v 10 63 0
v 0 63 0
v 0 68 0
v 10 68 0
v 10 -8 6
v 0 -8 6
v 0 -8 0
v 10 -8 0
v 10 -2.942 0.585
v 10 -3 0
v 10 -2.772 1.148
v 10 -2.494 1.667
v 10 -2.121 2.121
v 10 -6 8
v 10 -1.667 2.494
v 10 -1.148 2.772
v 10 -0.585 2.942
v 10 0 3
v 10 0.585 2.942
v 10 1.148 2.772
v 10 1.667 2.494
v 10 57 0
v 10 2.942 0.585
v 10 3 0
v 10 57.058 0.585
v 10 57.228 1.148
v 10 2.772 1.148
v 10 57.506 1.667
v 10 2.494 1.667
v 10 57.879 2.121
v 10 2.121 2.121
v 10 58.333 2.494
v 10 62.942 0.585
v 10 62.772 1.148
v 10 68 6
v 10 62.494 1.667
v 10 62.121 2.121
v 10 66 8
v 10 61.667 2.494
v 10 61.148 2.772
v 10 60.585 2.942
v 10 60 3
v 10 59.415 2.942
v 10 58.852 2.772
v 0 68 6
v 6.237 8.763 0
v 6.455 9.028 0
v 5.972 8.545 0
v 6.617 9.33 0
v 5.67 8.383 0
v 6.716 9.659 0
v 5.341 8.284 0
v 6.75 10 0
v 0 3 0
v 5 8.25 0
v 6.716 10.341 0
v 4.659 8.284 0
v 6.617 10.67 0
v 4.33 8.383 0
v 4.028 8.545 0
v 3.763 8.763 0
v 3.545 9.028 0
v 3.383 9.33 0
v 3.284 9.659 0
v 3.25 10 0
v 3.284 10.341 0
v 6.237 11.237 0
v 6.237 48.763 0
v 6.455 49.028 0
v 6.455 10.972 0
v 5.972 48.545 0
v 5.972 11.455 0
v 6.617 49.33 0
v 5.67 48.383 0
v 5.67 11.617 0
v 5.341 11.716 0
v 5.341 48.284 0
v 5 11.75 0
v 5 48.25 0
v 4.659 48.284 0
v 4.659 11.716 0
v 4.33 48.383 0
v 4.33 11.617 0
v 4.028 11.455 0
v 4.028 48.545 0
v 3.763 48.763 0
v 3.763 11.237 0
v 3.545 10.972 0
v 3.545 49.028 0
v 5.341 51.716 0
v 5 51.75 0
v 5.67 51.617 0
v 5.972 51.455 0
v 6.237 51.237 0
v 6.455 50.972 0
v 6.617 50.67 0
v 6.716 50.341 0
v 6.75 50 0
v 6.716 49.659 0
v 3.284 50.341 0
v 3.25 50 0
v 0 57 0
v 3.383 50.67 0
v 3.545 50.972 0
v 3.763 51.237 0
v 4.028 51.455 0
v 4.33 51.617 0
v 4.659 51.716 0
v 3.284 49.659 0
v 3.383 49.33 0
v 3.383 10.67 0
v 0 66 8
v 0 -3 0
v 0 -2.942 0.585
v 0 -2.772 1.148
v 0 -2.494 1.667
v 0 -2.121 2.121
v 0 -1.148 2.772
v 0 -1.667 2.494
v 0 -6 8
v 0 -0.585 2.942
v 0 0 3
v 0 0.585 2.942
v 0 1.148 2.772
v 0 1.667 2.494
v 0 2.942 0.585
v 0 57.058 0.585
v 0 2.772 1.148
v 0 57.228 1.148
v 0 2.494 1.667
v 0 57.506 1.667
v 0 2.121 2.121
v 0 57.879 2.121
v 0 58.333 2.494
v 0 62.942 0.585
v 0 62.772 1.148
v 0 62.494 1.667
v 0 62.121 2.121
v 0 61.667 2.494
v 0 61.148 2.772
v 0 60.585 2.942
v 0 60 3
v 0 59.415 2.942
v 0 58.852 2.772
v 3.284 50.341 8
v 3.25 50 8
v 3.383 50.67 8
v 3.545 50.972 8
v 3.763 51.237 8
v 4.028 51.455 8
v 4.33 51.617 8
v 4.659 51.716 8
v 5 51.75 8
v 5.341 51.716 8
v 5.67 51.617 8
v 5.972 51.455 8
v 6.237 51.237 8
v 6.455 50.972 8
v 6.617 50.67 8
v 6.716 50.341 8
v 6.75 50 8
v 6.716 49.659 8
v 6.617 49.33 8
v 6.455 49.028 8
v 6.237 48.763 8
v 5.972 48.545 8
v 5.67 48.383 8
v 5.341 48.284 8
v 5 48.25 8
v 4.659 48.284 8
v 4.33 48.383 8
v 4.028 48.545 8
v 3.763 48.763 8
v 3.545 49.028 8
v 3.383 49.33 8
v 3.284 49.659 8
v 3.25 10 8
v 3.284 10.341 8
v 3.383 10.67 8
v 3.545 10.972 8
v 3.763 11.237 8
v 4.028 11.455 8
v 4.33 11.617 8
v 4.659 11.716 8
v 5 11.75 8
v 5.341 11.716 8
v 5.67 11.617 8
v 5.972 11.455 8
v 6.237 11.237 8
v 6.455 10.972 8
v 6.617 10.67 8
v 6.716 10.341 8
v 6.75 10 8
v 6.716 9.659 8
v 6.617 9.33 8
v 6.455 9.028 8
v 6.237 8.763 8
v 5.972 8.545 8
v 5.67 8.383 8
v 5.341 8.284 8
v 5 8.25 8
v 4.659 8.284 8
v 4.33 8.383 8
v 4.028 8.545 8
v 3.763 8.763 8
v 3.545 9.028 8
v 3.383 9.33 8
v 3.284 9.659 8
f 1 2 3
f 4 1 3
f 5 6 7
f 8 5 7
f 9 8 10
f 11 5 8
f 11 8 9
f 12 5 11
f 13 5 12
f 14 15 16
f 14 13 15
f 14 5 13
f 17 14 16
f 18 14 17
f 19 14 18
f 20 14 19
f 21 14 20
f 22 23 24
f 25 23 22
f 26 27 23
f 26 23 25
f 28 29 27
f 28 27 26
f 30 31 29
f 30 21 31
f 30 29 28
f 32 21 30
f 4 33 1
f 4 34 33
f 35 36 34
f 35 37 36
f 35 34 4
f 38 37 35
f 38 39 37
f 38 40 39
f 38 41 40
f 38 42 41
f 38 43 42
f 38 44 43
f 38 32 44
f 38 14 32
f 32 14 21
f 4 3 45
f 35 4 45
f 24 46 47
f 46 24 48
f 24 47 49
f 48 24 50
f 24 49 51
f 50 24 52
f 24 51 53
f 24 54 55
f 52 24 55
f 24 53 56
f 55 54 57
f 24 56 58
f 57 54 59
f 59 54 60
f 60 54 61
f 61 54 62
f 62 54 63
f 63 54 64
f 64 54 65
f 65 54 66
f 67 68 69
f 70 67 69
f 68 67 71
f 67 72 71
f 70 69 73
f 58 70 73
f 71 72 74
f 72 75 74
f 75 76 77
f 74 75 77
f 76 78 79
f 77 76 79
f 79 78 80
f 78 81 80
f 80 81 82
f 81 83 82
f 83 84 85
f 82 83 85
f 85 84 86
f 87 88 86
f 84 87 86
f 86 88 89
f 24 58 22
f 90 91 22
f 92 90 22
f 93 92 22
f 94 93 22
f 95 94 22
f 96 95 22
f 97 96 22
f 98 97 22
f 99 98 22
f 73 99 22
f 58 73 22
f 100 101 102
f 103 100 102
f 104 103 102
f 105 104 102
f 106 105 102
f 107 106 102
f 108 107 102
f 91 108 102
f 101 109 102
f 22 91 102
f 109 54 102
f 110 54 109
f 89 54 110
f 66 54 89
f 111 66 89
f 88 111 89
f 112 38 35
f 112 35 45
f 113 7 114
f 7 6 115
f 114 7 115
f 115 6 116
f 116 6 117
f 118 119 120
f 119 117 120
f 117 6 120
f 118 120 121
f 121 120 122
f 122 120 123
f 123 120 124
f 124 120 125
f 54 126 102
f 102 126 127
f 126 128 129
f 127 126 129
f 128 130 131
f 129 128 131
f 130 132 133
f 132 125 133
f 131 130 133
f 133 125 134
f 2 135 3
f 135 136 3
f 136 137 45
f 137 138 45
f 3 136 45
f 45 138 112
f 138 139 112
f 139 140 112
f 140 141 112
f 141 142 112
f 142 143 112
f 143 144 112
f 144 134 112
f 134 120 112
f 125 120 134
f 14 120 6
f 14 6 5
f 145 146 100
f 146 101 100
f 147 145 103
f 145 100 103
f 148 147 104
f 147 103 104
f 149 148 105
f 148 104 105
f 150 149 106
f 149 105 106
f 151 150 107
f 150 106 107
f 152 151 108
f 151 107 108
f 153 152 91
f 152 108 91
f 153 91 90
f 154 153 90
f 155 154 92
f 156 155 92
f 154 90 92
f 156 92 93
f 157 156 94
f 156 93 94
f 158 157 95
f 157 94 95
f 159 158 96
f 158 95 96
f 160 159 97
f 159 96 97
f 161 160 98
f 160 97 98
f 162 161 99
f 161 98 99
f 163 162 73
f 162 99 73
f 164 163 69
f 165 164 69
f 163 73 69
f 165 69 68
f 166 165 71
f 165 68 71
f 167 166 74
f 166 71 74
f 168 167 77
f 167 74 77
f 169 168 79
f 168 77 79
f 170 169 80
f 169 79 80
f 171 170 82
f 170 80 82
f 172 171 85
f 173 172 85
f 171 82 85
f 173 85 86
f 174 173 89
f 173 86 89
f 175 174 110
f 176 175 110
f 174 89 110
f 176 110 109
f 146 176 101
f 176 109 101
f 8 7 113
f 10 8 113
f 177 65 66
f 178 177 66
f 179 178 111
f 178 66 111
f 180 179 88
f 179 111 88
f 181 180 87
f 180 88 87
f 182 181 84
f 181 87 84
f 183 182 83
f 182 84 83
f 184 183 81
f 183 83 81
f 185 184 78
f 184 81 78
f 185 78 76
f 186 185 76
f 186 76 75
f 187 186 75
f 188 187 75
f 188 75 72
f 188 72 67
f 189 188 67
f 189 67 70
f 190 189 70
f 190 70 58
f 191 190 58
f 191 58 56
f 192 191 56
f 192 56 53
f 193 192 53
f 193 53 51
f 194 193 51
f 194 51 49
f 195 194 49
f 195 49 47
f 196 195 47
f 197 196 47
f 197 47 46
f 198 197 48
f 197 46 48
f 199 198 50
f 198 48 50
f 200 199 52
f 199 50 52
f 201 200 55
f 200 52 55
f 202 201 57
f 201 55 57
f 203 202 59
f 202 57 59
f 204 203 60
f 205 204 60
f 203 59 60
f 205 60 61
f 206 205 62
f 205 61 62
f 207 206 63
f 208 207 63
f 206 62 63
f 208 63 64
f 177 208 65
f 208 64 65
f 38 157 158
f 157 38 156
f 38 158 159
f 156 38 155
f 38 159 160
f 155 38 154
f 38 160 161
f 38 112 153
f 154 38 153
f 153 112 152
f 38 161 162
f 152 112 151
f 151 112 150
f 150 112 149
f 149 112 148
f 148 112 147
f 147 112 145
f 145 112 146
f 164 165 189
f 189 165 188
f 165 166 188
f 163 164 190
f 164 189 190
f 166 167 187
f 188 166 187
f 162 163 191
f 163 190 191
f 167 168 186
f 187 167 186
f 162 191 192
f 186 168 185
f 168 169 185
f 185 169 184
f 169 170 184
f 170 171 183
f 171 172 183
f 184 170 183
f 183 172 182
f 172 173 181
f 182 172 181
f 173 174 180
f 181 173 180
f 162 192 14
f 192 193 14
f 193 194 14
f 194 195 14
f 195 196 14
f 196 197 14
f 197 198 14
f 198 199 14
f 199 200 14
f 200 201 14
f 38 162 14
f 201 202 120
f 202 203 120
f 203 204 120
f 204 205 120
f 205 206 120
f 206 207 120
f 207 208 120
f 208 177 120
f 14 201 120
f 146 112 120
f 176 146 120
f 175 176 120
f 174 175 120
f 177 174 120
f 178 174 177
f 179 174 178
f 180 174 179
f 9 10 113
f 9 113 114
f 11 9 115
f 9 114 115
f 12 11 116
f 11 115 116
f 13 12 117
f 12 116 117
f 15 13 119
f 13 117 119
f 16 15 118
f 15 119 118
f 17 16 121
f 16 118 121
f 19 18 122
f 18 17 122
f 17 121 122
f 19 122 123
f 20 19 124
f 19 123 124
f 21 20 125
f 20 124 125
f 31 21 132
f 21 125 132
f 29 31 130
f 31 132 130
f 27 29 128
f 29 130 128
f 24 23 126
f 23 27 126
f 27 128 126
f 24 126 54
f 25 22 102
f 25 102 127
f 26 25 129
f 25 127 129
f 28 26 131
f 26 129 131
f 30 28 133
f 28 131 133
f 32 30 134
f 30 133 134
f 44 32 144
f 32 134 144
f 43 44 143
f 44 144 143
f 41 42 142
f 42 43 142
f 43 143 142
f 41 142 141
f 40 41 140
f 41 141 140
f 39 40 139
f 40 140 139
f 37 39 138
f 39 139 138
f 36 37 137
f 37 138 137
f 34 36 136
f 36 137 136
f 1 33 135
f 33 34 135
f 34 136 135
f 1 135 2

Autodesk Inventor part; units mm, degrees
ref_plane "YZ Plane" through (0, 0, 0) normal (1, 0, 0) x (0, 1, 0)
ref_plane "XZ Plane" through (0, 0, 0) normal (0, 1, 0) x (-1, 0, 0)
ref_plane "XY Plane" through (0, 0, 0) normal (0, 0, 1) x (1, 0, 0)
sketch "Szkic1" plane through (0, 0, 0) normal (1, 0, 0) x (0, 1, 0)
  circle A0 centre (0, 0) radius 3 construction
  circle A1 centre (60, 0) radius 3 construction
  arc A2 (63, 0) -> (57, 0) centre (60, 0) ccw
  arc A3 (3, 0) -> (-3, 0) centre (0, 0) ccw
  line L0 (68, 0) -> (68, 8)
  line L1 (68, 8) -> (-8, 8)
  line L2 (-8, 8) -> (-8, 0)
  line L3 (63, 0) -> (68, 0)
  line L4 (-8, 0) -> (-3, 0)
  line L5 (3, 0) -> (57, 0)
  point P0 (-5.5, 0)
  dimension "d0" = 6
  dimension "d1" = 6
  dimension "d2" = 60
  dimension "d3" = 6
  dimension "d4" = 5
  dimension "d5" = 8
extrude "Wyciągnięcie proste1" add sketch "Szkic1" along normal blind 10
sketch "Szkic2" plane through (0, 3, 0) normal (0, 0, -1) x (-1, 0, 0)
  line L0 (0, 65) -> (-10, 65) construction
  line L1 (-5, 65) -> (-5, -11.1641) construction
  line L2 (-10, 65) -> (-10, -11) construction
  line L3 (-10, 27) -> (0, 27) construction
  line L4 (0, 65) -> (0, -11) construction
  circle A0 centre (-5, 47) radius 1.75
  circle A1 centre (-5, 7) radius 1.75
  circle A2 centre (-5, 37) radius 1.75
  circle A3 centre (-5, 17) radius 1.75
  point P0 (0, -3)
  dimension "d8" = 3.5
  dimension "d9" = 20
  dimension "d15" = 3.5
  dimension "d16" = 10
extrude "Wyciągnięcie proste2" cut sketch "Szkic2" against normal up to next contours A0 | A1
chamfer "Faza1" distance 2 angle 45 2 edges at (5, 68, 8) (5, -8, 8)
ref_plane "Płaszczyzna konstrukcyjna1" through (5, 68, 6) normal (0, 1, 0) x (1, 0, 0)
sketch "Szkic3" plane through (5, 68, 6) normal (0, 1, 0) x (1, 0, 0)
  point P0 (-5, 6)
sketch "Szkic4" plane through (5, 68, 6) normal (0, 1, 0) x (1, 0, 0)
  line L0 (29.238, 4.1877) -> (10.4797, -9.1212)
  line L1 (11.1628, -10.084) -> (10.4797, -9.1212)
  line L2 (13.5481, -13.4459) -> (11.1628, -10.084)
  line L3 (29.9211, 3.2248) -> (29.238, 4.1877)
  line L4 (29.9211, 3.2248) -> (32.3064, -0.1371)
  point P0 (-5, 6)
ref_plane "Płaszczyzna konstrukcyjna2" through (17.8649, 60.2933, 18.4831) normal (-0.5693, 0.1792, -0.8024) x (0.1037, 0.9838, 0.1462)
ref_plane "Płaszczyzna konstrukcyjna3" through (26.0515, 48.9795, 10.1477) normal (-0.5693, 0.1792, -0.8024) x (0.8156, 0, -0.5786)
sketch "Szkic5" plane through (26.0515, 48.9795, 10.1477) normal (-0.5693, 0.1792, -0.8024) x (0.8156, 0, -0.5786)
  line L0 (11.5, -11.5) -> (11.5, 11.5) construction
  line L1 (11.5, 11.5) -> (-11.5, 11.5) construction
  line L2 (-11.5, 11.5) -> (-11.5, -11.5) construction
  line L3 (-11.5, -11.5) -> (11.5, -11.5) construction
  line L4 (-11.5, 11.5) -> (18.547, 11.5)
  line L5 (18.547, 11.5) -> (18.547, -17.121)
  line L6 (18.547, -17.121) -> (-11.5, -17.121)
  line L7 (-11.5, -17.121) -> (-11.5, 11.5)
  circle A0 centre (14.589, 7.796) radius 1.45
  line L8 (18.547, -17.121) -> (-11.5, 11.5) construction
  circle A1 centre (-6.5329, -14.3782) radius 1.45
  point P0 (-15.3751, 52.3715)
  dimension "d17" = 30.047
  dimension "d18" = 2.9
  dimension "d19" = 3.704
  dimension "d20" = 3.958
  dimension "d21" = 28.621
extrude "Wyciągnięcie proste3" [suppressed]
sketch "Szkic6" plane through (18.5909, 67.18, 19.5063) normal (0.1037, 0.9838, 0.1462) x (0.8156, 0, -0.5786)
  line L0 (0, 0) -> (30, 0) projected
  line L1 (30, 0) -> (30, 4) projected
  line L2 (0, 4) -> (30, 4) projected
  line L3 (0, 0) -> (0, 4) projected
  line L4 (2, 7) -> (26.5831, 7)
  line L5 (26.5831, 7) -> (26.5831, 10)
  line L6 (26.5831, 10) -> (0, 10)
  line L7 (0, 10) -> (0, 4)
  arc A0 (2, 7) -> (2, 4) centre (2, 5.5) ccw
  point P0 (-3.8751, 14.1945)
  dimension "d24" = 3
  dimension "d25" = 2.042
  dimension "d26" = 3.062
extrude "Wyciągnięcie proste4" [suppressed]
sketch "Szkic7" plane through (34.5787, 68.9722, -3.8997) normal (-0.5693, 0.1792, -0.8024) x (-0.8156, 0, 0.5786)
  line L0 (26.5831, -27.9454) -> (26.3218, -30) projected
  line L1 (26.5831, 0) -> (26.5831, -27.9454) projected
  line L2 (0, 0) -> (26.5831, 0) projected
  line L3 (0, 0) -> (0, -30) projected
  line L4 (0, -30) -> (26.3218, -30) projected
  line L5 (0, -20) -> (0, -10)
  line L6 (0, 0) -> (0, -30) projected
  line L7 (26.5831, 0) -> (26.5831, -26.8739)
  circle A0 centre (4, -15) radius 1.45
  line L8 (26.5831, 0) -> (26.5831, -30)
  line L9 (26.5831, -30) -> (21.5831, -30)
  line L10 (-3.4169, -30) -> (24.5831, -30) projected
  line L11 (21.5831, -30) -> (0, -20)
  line L12 (0, -10) -> (21.5831, 0)
  line L13 (26.5831, 0) -> (21.5831, 0)
  line L14 (21.5831, -30) -> (26.5831, -30)
  point P0 (30.4582, -70.8715)
  point P1 (0, -15)
  point P2 (0, -10)
  point P3 (21.5831, -30)
  dimension "d29" = 11.638
  dimension "d32" = 2.9
  dimension "d33" = 6.646
  dimension "d34" = 3.439
extrude "Wyciągnięcie proste5" [suppressed]
sketch "Szkic11" plane through (10, 0, 0) normal (1, 0, 0) x (0, 0, -1)
  line L0 (6.8231, 49.296) -> (-4.2042, 39.4579) projected
  line L1 (-4.2042, 39.4579) -> (-6.9463, 39.4579) projected
  line L2 (-7.3978, 41.4793) -> (-6.9463, 39.4579) projected
  line L3 (-11.4825, 68.9722) -> (-7.3978, 41.4793) projected
  line L4 (-8.5893, 68.9722) -> (-11.4825, 68.9722) projected
  line L5 (-8.5893, 68.9722) -> (5.3614, 59.1341) projected
  line L6 (5.3614, 59.1341) -> (6.8231, 49.296) projected
  ellipse E0 centre (3.7776, 54.2151) end of major axis (4.0937, 52.7999) minor radius 0.8255 projected
  line L7 (0, 3) -> (0, 57) projected
  line L8 (-8, 66) -> (-8, -6) projected
  line L9 (0, 43.2088) -> (0, 62.915)
  line L10 (0, 62.915) -> (-6.5007, 67.4993)
  line L11 (-6.5007, 67.4993) -> (-8, 66)
  line L12 (-8, 66) -> (-8, 45.5327)
  point P0 (0, 0)
  point P1 (0, 0)
  point P2 (0, 0)
  point P3 (0, 0)
  point P4 (0, 0)
extrude "Wyciągnięcie proste8" [suppressed]
sketch "Szkic8" plane through (10, 0, 0) normal (1, 0, 0) x (0, 0, -1)
  line L0 (-2.1469, 67.18) -> (2.2382, 37.6657) projected
  line L1 (2.2382, 37.6657) -> (5.4477, 38.3826) projected
  line L2 (1.0626, 67.8969) -> (5.4477, 38.3826) projected
  line L3 (-2.1469, 67.18) -> (1.0626, 67.8969) projected
  line L4 (1, 2.8284) -> (1, 57.1716)
  line L5 (5.3614, 59.1341) -> (6.8231, 49.296) projected
  arc A0 (0, 63) -> (0, 57) centre (0, 60) ccw projected
  line L6 (9.8159, 60) -> (9.8159, 68.4413)
  line L7 (9.8159, 68.4413) -> (-3.5, 68.4413)
  line L8 (-3.5, 68.4413) -> (-3.5, 60)
  line L9 (0, 56.5) -> (9.8159, 56.5)
  line L10 (9.8159, 56.5) -> (9.8159, 60)
  arc A1 (-3.5, 60) -> (0, 56.5) centre (0, 60) ccw
  point P0 (0, 0)
  dimension "d42" = 3.5
extrude "Wyciągnięcie proste6" [suppressed]
sketch "Szkic12" plane through (17.091, 68.1657, 13.9359) normal (0.1037, 0.9838, 0.1462) x (0.8156, 0, -0.5786)
  line L0 (20.9791, -1.5) -> (18.9515, -1.5) projected
  line L1 (26.5257, -5.5) -> (20.9791, -1.5) projected
  line L2 (24.6821, -5.5) -> (26.5257, -5.5) projected
  line L3 (18.9515, -1.5) -> (24.6821, -5.5) projected
  line L4 (28, -5.5) -> (-2, -5.5) projected
  line L5 (18.9515, -1.5) -> (28, -1.5)
  line L6 (28, -1.5) -> (28, -5.5)
  line L7 (28, -5.5) -> (18.9515, -5.5)
  line L8 (18.9515, -5.5) -> (18.9515, -1.5)
  point P0 (-5.8751, 8.6945)
  point P1 (18.9515, -5.5)
extrude "Wyciągnięcie proste9" [suppressed]
sketch "Szkic13" plane through (0, 0, 0) normal (-1, 0, 0) x (0, 0, 1)
  line L0 (6.5007, 67.4993) -> (8, 66) projected
  line L1 (8, 66) -> (8, 45.5327) projected
  line L2 (11.4825, 68.9722) -> (8, 45.5327) projected
  line L3 (8.5893, 68.9722) -> (11.4825, 68.9722) projected
  line L4 (8.5893, 68.9722) -> (6.5007, 67.4993) projected
  line L5 (63.0199, 65.5599) -> (-3.0201, 65.5599)
  line L6 (15.1212, 37.6657) -> (19.5063, 67.18) projected
  line L7 (19.5063, 67.18) -> (11.4825, 68.9722) projected
  line L8 (11.4825, 68.9722) -> (8, 45.5327) projected
  line L9 (8, 45.5327) -> (7.3978, 41.4793) projected
  line L10 (7.3978, 39.3909) -> (7.3978, 41.4793) projected
  line L11 (15.1212, 37.6657) -> (7.3978, 39.3909) projected
  line L12 (8, -6) -> (6, -8) projected
  line L13 (8, 66) -> (8, -6) projected
  line L14 (6, 68) -> (8, 66) projected
  line L15 (0, 68) -> (6, 68) projected
  line L16 (0, 63) -> (0, 68) projected
  arc A0 (0, 57) -> (0, 63) centre (0, 60) ccw projected
  line L17 (0, 3) -> (0, 57) projected
  arc A1 (0, -3) -> (0, 3) centre (0, 0) ccw projected
  line L18 (0, -8) -> (0, -3) projected
  line L19 (6, -8) -> (0, -8) projected
  line L20 (8, 66) -> (8, -6) projected
  line L21 (8, 39.2563) -> (0, 39.2563)
  line L22 (0, 3) -> (0, 57) projected
  point P0 (8, 39.2563)
extrude "Wyciągnięcie proste10" [suppressed]
sketch "Szkic14" plane through (10.4273, 45.5327, 8) normal (0.8156, 0, -0.5786) x (-0.5786, 0, -0.8156)
  point P0 (12.5583, -45.5327)
sketch "Szkic15" plane through (10.4273, 45.5327, 8) normal (0.8156, 0, -0.5786) x (-0.5786, 0, -0.8156)
  line L0 (-4.27, 23.4395) -> (0, 0) projected
  line L1 (0, 20.4673) -> (0, 0) projected
  line L2 (1.8383, 21.9666) -> (0, 20.4673) projected
  line L3 (1.8383, 21.9666) -> (-0.7226, 23.4395) projected
  line L4 (-0.7226, 23.4395) -> (-4.27, 23.4395) projected
  point P0 (12.5583, -45.5327)
sketch "Szkic16" plane through (0, 68, 0) normal (0, 1, 0) x (1, 0, 0)
  line L0 (0, 0) -> (43.9824, 0)
  line L1 (43.9824, 0) -> (43.9824, -26.4065)
  line L2 (43.9824, -26.4065) -> (0, -26.4065)
  line L3 (0, -26.4065) -> (0, 0)
extrude "Wyciągnięcie proste11" [suppressed]
sketch "Szkic17" plane through (0, 67, 0) normal (0, 1, 0) x (1, 0, 0)
  point P0 (0, 0)
sketch "Szkic18" plane through (0, 67, 0) normal (0, 1, 0) x (1, 0, 0)
  line L0 (20.2969, -5.7927) -> (21.0993, -8.9622) projected
  line L1 (20.2969, -5.7927) -> (11.6216, -12.236)
  line L2 (11.6216, -12.236) -> (8.0042, -6.3815)
  line L3 (8.0042, -6.3815) -> (20.2969, -5.7927)
  point P0 (0, 0)
extrude "Wyciągnięcie proste12" [suppressed]
sketch "Szkic19" plane through (0, 67, 0) normal (0, 1, 0) x (1, 0, 0)
  point P0 (0, 0)
properties part number "6_2xclamp_main"
